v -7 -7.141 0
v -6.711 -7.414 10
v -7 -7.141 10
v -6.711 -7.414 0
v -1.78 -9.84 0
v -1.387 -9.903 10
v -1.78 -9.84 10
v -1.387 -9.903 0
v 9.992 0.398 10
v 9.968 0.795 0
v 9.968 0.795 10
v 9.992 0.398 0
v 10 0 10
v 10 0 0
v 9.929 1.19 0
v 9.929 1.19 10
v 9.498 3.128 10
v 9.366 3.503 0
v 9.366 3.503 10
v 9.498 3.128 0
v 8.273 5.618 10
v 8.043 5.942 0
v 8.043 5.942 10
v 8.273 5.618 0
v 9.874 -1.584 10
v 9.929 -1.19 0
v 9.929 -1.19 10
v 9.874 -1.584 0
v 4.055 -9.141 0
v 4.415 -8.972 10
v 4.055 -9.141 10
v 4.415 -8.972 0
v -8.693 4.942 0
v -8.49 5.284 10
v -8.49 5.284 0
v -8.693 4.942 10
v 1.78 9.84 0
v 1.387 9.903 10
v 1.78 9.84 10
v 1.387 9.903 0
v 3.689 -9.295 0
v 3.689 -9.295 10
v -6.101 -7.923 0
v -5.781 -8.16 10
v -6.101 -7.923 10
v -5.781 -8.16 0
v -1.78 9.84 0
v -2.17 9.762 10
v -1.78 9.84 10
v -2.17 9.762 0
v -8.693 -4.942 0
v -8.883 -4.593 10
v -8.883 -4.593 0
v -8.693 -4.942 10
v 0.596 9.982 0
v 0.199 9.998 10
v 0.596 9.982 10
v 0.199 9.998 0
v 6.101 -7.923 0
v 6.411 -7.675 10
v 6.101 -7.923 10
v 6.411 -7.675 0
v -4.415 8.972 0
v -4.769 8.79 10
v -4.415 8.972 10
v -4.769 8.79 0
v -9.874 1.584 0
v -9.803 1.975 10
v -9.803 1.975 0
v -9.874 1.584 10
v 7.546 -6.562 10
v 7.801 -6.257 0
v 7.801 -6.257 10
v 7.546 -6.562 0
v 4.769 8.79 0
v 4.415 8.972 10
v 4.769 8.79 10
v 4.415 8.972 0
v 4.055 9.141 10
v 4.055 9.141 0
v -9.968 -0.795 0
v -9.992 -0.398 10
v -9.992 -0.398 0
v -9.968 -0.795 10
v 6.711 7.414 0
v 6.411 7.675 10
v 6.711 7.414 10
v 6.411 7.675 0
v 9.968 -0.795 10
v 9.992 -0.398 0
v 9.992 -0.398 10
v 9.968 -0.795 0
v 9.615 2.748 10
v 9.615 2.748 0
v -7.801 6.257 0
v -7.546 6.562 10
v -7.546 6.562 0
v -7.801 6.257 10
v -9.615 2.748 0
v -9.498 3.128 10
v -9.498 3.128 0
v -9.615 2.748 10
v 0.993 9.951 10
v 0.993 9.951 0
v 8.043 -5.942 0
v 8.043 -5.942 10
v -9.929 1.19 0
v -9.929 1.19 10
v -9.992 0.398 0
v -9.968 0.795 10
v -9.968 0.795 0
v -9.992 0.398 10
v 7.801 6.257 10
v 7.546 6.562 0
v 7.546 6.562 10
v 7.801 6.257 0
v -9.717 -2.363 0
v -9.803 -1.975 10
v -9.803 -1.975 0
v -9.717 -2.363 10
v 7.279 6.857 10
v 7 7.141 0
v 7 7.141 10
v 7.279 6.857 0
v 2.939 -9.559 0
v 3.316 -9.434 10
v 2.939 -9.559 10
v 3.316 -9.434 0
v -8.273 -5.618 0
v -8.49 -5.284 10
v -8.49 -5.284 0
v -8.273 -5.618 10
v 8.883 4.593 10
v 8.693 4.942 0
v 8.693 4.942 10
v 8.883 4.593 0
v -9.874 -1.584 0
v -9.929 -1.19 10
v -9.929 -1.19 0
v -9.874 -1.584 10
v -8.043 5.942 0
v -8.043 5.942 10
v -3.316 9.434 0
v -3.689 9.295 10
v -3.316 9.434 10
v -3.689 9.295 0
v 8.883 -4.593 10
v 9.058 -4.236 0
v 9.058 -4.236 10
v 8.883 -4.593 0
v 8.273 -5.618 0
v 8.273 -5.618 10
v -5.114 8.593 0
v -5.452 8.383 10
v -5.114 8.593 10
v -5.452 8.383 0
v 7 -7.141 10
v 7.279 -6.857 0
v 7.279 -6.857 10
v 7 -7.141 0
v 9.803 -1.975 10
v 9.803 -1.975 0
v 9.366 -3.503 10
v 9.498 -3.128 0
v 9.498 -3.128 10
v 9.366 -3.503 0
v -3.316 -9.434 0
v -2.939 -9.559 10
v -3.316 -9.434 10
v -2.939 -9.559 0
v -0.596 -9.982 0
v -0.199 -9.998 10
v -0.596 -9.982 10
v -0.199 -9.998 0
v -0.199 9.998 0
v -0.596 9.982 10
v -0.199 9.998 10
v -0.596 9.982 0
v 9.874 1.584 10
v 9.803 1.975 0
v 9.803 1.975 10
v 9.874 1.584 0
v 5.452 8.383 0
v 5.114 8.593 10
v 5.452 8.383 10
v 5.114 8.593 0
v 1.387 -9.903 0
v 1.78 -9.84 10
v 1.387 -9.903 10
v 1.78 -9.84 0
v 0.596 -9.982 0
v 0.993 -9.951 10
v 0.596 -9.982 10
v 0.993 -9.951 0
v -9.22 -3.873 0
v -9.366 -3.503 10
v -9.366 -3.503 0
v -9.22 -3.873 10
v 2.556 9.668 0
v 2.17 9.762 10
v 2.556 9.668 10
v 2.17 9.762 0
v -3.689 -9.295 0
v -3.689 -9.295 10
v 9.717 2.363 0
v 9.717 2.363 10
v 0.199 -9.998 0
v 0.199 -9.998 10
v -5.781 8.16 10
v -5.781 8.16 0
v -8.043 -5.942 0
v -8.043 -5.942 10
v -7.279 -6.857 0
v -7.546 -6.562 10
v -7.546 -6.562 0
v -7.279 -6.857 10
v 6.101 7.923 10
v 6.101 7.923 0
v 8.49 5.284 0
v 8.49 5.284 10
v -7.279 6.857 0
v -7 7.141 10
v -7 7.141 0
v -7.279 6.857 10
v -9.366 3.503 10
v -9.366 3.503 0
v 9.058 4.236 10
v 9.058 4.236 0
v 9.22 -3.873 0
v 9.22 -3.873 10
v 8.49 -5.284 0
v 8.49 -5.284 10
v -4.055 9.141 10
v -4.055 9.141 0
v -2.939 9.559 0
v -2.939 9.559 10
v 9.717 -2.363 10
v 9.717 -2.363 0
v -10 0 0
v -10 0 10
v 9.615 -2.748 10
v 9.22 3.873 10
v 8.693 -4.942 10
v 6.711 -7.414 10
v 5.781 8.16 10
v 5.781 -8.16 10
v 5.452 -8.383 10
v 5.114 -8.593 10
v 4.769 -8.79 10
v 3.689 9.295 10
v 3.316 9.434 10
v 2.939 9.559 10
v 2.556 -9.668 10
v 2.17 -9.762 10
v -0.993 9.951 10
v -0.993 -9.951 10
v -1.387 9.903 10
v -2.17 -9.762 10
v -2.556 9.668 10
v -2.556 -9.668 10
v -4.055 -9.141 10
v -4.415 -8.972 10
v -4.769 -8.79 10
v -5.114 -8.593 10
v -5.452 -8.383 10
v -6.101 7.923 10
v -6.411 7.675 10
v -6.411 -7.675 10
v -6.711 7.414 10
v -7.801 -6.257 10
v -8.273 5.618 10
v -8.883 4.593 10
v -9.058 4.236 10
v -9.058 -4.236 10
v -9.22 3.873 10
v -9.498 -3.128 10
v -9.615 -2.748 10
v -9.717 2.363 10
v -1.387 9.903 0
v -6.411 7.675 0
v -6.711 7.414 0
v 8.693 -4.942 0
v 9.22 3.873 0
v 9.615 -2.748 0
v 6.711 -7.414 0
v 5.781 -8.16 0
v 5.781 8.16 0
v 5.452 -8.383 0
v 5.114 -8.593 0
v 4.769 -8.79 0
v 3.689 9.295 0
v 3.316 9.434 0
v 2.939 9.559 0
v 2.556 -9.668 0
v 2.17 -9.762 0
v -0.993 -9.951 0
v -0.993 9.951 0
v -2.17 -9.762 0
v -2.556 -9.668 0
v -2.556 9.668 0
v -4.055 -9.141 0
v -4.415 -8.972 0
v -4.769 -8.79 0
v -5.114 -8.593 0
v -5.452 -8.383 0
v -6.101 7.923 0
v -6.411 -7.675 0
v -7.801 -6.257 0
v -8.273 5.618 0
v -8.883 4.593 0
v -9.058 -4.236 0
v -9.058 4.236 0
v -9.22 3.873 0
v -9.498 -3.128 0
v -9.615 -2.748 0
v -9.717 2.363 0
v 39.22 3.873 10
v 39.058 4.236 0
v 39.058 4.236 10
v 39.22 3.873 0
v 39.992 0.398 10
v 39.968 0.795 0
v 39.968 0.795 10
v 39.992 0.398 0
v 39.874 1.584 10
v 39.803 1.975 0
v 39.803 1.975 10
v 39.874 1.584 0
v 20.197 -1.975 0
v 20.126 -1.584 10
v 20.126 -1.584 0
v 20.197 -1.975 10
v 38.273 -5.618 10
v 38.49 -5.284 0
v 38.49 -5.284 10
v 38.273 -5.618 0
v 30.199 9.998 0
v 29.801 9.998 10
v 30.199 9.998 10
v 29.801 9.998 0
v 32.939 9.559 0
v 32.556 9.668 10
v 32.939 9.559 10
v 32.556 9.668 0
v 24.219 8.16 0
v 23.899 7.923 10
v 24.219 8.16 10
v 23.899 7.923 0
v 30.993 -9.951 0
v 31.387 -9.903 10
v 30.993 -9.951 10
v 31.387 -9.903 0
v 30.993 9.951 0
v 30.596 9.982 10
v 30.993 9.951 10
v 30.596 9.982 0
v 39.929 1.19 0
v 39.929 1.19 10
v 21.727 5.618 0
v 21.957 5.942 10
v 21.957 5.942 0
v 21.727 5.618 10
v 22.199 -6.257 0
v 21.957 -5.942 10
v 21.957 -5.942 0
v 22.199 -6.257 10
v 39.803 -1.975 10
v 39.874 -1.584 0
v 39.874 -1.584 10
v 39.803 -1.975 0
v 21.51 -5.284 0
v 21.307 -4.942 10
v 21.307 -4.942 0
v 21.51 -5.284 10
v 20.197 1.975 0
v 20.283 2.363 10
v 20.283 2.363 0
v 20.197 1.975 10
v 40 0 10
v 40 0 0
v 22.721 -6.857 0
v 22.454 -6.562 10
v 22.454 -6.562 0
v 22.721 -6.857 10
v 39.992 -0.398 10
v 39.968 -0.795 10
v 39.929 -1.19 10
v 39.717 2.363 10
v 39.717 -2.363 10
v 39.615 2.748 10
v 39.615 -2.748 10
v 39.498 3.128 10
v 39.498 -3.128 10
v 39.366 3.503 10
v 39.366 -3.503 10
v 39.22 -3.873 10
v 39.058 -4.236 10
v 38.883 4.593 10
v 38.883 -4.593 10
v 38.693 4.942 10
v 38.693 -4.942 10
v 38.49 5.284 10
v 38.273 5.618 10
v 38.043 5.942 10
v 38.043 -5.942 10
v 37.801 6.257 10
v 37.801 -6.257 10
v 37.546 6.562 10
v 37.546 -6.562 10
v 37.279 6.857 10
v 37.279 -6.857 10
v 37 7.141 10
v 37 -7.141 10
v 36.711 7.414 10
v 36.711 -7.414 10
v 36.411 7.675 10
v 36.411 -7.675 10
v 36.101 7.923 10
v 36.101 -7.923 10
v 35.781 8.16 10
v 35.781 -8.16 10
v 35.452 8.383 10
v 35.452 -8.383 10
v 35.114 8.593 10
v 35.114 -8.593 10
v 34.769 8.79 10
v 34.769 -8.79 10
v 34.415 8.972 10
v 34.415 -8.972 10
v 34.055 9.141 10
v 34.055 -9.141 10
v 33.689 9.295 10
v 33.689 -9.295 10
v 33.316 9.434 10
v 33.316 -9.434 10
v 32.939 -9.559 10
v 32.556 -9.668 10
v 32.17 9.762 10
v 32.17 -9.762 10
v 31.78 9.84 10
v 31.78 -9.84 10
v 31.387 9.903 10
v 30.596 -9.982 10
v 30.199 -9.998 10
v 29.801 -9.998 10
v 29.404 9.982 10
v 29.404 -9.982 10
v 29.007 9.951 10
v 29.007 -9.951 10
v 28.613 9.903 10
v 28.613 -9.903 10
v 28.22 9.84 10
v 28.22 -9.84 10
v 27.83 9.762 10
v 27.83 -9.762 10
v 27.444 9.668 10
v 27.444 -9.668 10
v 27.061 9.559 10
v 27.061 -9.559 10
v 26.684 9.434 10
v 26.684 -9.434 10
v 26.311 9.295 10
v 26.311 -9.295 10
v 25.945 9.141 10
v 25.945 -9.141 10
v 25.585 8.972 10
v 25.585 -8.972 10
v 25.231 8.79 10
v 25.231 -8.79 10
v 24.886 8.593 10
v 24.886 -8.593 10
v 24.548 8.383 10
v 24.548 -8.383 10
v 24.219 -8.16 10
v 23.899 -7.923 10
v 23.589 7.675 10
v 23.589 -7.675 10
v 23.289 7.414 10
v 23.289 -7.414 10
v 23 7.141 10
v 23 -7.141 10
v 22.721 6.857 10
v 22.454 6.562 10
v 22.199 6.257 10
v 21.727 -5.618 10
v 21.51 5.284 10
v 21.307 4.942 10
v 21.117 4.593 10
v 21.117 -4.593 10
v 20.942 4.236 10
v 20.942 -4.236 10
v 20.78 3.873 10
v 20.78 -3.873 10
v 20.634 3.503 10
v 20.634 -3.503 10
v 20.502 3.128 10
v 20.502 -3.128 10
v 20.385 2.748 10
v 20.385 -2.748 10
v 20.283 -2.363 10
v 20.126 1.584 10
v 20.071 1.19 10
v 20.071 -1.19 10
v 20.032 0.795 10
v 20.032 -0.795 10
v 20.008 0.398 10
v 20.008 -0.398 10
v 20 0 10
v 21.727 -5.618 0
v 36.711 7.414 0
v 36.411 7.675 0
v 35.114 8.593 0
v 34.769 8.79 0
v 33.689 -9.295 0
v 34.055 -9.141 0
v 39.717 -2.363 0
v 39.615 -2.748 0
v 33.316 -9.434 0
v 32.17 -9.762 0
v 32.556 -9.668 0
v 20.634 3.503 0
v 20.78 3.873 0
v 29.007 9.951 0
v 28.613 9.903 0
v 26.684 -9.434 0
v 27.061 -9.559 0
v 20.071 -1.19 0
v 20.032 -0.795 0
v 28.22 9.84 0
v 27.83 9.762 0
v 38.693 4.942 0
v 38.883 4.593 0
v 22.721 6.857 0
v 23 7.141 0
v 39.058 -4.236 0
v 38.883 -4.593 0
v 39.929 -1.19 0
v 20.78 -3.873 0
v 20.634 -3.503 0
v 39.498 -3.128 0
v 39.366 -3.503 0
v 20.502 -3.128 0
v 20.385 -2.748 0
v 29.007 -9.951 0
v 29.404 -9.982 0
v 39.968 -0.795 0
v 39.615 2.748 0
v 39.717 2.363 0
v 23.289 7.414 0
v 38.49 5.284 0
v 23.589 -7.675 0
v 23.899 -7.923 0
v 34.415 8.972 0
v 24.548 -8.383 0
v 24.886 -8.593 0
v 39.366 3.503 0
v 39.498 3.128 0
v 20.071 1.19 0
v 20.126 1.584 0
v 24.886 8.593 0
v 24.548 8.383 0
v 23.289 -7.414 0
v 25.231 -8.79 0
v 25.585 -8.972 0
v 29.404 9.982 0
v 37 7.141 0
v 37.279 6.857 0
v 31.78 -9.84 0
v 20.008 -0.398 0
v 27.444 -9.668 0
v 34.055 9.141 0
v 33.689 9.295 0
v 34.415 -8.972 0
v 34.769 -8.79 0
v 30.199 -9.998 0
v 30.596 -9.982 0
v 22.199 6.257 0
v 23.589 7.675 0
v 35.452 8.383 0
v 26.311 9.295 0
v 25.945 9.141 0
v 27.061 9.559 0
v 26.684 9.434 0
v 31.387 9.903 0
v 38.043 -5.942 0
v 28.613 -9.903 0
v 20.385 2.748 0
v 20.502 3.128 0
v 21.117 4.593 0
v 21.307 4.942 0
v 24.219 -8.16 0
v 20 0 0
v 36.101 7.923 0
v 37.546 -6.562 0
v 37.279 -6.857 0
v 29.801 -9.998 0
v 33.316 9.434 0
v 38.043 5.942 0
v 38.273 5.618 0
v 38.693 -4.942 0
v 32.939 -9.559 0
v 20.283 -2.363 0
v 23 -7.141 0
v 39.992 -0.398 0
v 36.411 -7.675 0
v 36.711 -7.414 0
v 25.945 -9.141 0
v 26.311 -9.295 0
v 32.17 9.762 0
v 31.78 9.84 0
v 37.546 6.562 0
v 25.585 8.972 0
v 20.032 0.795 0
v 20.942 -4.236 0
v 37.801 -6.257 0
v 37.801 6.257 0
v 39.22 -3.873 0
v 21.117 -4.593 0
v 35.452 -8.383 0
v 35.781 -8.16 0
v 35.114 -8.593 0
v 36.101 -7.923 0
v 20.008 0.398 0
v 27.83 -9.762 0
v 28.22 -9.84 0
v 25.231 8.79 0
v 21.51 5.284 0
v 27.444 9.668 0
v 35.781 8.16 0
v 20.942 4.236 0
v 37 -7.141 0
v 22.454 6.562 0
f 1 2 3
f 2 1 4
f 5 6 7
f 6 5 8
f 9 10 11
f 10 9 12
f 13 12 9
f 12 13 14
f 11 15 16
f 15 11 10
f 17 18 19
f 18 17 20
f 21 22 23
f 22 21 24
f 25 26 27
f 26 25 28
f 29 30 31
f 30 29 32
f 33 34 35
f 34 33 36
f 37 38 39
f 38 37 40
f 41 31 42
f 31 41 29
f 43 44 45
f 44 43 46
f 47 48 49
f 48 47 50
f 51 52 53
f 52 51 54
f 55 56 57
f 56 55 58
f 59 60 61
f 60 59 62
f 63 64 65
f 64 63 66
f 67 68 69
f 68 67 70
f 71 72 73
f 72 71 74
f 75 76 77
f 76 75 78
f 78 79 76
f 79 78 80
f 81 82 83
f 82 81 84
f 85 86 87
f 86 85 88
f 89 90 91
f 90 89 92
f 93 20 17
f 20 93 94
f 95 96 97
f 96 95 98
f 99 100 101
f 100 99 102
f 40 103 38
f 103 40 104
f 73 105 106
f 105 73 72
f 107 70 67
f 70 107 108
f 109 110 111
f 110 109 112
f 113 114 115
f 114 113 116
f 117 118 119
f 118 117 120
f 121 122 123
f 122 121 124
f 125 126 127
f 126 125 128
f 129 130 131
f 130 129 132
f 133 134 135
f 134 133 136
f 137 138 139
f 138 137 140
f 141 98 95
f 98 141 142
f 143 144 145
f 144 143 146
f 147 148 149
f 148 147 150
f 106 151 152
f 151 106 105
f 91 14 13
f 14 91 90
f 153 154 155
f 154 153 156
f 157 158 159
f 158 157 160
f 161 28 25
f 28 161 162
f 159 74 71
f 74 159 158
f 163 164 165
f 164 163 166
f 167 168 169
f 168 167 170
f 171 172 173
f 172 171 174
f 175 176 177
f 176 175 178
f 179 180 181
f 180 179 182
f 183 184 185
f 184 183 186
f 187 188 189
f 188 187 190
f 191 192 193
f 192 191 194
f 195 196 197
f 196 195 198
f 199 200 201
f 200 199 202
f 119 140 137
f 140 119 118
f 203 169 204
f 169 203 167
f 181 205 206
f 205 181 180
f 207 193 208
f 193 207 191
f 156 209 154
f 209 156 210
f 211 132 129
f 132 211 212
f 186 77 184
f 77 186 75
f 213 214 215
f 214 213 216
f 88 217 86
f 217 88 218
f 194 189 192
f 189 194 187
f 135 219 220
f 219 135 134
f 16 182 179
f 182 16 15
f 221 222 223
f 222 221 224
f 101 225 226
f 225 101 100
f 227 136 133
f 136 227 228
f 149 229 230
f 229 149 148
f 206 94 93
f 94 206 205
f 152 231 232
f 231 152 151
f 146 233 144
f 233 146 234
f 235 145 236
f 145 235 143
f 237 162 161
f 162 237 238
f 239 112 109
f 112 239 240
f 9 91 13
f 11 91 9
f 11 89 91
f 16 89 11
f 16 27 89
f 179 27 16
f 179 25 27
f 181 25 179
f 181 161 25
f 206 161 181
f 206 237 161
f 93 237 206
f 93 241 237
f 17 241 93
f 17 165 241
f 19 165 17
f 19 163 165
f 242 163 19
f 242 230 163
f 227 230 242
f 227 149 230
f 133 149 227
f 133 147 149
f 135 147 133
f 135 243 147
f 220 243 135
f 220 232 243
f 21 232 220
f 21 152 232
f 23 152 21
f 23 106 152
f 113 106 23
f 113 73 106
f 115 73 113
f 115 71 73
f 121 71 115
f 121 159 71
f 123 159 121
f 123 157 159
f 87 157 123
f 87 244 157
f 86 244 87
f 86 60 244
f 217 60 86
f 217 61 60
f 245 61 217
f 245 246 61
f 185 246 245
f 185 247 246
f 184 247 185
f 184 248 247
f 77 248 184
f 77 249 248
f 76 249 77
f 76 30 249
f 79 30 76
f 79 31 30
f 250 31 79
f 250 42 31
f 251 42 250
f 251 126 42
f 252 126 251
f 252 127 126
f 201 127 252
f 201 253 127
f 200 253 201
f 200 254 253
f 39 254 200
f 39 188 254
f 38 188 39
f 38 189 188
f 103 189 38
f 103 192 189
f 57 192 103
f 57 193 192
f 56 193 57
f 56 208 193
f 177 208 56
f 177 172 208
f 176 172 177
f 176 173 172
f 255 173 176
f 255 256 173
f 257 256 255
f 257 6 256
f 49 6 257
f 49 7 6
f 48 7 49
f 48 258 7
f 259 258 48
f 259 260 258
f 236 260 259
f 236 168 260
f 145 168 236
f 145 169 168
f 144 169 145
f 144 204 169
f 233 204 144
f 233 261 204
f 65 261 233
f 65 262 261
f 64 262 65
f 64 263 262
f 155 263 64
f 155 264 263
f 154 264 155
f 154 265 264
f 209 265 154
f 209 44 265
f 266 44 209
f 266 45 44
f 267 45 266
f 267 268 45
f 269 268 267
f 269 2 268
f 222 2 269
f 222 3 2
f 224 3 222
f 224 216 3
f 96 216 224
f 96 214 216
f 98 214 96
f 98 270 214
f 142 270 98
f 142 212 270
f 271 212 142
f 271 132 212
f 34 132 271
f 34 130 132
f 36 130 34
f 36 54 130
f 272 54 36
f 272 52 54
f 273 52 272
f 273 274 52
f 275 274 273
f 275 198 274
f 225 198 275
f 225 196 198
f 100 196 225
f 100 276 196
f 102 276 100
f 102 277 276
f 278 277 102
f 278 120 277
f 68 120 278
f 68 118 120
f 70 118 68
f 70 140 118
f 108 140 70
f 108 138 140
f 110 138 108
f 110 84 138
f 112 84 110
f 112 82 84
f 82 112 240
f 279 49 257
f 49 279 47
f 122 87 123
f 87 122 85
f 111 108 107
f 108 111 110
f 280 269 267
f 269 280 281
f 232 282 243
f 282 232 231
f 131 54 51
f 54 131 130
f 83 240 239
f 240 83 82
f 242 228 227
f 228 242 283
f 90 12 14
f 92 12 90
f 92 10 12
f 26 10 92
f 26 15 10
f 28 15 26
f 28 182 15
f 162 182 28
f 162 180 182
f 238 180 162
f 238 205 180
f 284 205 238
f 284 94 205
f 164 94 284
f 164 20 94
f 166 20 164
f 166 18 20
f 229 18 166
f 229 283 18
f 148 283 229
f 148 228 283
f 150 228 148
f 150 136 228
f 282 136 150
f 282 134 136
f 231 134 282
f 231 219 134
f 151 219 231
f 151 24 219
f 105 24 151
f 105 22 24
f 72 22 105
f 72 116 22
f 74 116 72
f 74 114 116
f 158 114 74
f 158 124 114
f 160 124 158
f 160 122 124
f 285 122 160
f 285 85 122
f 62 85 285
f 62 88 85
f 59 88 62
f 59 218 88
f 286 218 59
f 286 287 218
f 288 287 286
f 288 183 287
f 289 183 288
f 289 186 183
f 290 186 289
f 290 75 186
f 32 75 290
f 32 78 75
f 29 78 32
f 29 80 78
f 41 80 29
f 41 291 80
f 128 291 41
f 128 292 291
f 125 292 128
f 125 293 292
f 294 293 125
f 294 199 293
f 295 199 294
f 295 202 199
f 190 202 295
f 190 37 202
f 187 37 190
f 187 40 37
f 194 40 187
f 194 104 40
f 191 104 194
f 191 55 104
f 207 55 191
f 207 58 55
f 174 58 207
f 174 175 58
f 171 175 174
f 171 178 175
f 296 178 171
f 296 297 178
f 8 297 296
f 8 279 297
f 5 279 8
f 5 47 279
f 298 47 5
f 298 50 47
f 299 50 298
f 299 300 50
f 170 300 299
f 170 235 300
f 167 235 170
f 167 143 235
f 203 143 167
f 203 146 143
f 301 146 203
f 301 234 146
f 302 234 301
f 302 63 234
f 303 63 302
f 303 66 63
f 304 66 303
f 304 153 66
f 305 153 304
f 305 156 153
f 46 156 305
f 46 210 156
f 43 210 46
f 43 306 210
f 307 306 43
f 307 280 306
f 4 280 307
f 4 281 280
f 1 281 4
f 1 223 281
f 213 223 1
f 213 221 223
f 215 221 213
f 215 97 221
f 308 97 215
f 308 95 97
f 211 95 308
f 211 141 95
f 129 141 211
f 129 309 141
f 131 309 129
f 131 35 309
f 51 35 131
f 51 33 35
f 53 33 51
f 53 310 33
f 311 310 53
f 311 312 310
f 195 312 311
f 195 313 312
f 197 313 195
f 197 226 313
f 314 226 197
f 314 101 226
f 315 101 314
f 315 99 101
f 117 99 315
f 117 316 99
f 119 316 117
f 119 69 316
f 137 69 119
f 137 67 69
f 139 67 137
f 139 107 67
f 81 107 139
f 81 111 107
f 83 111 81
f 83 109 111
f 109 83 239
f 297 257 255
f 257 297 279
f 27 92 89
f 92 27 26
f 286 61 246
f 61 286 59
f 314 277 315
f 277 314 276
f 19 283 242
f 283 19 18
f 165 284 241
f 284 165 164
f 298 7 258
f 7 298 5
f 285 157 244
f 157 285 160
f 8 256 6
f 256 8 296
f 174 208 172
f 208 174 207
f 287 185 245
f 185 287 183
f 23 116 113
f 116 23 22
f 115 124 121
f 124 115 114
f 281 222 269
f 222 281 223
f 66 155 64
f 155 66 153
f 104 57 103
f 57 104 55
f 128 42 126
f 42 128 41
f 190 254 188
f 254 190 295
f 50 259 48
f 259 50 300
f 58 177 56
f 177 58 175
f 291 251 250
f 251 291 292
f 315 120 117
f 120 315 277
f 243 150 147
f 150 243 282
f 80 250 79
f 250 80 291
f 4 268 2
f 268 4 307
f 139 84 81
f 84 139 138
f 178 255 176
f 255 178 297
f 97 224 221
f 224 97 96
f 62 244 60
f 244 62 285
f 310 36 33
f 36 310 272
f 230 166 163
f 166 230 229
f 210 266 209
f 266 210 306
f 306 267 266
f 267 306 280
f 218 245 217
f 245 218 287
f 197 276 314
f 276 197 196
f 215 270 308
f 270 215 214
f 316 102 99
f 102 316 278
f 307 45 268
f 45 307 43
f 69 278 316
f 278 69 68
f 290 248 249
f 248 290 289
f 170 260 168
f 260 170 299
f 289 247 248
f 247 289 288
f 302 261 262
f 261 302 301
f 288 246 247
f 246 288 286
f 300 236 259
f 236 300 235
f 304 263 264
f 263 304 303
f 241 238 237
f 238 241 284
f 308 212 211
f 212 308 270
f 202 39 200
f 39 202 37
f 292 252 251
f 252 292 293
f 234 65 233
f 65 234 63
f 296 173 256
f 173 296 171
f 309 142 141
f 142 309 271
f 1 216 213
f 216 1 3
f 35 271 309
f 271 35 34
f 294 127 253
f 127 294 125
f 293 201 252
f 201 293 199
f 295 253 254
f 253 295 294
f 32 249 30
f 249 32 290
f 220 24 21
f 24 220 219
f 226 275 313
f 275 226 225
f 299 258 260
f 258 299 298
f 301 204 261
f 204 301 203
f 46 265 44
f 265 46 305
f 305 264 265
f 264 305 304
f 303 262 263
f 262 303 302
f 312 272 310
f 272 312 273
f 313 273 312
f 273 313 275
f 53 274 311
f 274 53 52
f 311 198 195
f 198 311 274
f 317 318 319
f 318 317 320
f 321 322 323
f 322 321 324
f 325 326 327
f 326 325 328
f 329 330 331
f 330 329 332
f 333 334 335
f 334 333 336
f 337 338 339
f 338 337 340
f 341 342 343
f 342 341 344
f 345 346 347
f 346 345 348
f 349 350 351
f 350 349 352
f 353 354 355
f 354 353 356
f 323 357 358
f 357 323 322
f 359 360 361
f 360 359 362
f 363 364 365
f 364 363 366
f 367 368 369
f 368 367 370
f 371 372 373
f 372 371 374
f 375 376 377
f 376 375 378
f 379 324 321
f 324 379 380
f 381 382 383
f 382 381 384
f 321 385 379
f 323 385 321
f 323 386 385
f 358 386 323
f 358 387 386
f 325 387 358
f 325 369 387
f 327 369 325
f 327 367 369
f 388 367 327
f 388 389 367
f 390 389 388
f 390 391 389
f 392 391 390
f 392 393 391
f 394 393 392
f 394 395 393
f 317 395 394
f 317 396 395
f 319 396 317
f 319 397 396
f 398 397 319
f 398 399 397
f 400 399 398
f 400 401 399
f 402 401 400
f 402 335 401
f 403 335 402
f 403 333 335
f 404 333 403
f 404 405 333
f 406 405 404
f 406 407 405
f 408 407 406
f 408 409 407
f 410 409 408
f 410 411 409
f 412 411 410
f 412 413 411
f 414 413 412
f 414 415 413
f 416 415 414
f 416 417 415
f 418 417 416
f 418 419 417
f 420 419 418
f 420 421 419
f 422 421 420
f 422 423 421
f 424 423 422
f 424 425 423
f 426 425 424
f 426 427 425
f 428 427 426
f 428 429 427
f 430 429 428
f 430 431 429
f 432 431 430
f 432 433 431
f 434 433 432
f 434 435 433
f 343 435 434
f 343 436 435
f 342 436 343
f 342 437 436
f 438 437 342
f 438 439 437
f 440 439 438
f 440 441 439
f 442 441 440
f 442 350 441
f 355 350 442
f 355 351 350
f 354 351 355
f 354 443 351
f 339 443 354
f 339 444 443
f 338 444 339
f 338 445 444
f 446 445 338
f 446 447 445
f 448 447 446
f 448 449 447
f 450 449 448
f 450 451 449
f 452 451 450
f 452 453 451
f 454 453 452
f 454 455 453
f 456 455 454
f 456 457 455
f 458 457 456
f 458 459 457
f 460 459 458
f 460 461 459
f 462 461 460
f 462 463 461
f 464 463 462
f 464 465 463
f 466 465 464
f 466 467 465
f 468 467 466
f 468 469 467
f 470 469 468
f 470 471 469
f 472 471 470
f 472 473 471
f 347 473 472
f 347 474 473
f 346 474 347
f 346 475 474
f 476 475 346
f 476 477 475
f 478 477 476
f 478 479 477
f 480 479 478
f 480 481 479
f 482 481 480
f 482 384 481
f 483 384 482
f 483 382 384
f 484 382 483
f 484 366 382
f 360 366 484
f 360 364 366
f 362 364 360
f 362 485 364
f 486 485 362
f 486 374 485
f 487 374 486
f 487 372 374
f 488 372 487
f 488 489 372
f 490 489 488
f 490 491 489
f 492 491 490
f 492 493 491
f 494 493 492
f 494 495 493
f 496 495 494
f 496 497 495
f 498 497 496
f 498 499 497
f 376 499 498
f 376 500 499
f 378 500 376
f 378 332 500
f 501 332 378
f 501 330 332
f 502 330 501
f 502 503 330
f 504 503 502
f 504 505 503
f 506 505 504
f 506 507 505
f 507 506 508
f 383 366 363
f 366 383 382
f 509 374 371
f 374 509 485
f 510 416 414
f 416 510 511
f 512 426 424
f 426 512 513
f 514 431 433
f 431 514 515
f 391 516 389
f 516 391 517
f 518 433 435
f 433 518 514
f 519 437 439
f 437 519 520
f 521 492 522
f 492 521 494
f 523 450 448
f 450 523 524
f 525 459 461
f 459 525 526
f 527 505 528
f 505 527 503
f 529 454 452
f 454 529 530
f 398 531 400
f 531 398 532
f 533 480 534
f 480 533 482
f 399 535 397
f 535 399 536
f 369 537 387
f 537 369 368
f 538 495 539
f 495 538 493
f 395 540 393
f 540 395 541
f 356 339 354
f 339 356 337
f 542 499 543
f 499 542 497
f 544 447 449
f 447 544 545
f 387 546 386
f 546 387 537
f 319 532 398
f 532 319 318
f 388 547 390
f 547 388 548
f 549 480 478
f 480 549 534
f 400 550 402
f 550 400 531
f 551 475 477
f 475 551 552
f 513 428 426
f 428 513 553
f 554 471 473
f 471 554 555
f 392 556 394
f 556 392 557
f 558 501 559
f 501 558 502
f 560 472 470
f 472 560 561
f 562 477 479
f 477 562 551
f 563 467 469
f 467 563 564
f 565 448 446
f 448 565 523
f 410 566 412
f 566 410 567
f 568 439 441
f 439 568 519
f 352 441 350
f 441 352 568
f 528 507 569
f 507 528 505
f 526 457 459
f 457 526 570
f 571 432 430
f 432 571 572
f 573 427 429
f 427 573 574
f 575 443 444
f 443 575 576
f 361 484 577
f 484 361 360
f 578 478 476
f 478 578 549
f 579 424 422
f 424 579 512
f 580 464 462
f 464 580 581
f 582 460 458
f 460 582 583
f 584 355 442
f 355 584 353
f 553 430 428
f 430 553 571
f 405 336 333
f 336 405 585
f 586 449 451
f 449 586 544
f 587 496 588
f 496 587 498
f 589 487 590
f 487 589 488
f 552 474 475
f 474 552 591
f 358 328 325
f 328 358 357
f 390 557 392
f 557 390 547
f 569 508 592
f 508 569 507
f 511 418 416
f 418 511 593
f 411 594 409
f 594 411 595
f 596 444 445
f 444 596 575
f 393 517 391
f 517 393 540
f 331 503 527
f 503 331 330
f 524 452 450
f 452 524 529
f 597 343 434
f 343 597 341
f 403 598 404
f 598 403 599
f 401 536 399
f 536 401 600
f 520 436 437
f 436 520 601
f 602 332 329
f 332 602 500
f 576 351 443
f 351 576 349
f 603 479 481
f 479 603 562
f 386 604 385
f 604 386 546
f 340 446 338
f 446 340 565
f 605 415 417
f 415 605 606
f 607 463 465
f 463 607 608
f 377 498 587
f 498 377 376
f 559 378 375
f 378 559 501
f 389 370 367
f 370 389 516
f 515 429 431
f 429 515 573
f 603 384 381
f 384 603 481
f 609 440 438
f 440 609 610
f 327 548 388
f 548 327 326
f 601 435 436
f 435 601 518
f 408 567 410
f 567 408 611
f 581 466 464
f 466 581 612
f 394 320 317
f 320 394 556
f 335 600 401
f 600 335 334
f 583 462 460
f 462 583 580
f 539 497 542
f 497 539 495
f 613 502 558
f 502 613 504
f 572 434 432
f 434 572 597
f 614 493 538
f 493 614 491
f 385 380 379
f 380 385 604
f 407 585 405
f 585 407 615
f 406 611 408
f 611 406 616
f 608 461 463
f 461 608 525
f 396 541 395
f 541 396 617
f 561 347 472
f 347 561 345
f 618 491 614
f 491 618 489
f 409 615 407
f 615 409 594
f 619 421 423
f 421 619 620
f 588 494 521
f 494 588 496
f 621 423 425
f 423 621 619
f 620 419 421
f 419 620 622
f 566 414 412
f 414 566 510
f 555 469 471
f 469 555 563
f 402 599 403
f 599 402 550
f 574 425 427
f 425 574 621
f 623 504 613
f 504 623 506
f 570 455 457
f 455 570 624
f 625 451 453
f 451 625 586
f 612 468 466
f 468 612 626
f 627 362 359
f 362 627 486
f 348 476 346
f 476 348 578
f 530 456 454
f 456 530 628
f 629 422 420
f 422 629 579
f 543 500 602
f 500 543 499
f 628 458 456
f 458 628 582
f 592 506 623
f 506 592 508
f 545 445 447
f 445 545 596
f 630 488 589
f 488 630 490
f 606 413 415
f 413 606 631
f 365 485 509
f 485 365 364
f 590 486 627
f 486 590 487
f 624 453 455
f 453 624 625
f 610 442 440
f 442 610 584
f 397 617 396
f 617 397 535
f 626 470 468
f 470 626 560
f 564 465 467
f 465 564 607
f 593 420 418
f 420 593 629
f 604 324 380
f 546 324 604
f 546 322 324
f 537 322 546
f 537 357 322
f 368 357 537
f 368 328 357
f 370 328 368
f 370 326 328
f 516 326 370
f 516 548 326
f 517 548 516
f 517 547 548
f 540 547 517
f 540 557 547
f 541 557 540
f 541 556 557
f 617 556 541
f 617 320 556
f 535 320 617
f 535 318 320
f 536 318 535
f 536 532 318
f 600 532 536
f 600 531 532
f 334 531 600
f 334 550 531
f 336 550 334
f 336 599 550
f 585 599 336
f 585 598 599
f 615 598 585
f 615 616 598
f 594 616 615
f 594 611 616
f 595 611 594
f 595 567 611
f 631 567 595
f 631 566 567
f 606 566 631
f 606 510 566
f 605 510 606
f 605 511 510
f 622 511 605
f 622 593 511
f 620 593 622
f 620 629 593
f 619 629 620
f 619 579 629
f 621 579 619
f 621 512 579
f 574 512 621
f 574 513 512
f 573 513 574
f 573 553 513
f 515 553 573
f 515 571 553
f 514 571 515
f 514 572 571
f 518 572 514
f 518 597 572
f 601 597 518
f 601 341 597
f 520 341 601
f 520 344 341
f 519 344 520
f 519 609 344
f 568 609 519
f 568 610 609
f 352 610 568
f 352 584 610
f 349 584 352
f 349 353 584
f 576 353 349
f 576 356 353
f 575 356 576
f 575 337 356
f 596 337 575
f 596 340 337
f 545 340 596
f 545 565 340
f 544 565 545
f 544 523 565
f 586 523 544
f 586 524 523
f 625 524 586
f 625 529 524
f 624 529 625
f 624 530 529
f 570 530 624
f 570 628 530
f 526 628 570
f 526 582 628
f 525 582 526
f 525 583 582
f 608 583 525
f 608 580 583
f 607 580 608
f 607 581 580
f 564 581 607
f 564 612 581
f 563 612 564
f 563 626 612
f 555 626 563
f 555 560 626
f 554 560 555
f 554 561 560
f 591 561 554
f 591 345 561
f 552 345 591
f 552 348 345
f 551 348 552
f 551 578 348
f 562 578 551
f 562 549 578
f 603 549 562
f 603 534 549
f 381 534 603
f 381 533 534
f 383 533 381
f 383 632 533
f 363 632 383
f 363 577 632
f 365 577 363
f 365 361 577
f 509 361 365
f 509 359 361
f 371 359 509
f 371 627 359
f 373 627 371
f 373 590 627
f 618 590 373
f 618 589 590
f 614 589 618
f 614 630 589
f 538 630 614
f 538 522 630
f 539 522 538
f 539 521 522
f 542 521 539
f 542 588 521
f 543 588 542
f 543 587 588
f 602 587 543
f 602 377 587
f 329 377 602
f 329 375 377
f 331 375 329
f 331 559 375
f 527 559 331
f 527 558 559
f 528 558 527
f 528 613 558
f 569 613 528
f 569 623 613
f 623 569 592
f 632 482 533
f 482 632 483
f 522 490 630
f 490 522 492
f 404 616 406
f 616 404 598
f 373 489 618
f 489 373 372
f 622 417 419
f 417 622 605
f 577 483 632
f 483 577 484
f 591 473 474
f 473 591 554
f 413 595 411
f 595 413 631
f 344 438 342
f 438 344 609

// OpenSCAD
$fa=1;
$fs=0.4;
height=10;
radius=5;
cylinder(h=height,r=radius);
radius=10;
translate([30,0,0])
    cylinder(h=height,r=radius);
